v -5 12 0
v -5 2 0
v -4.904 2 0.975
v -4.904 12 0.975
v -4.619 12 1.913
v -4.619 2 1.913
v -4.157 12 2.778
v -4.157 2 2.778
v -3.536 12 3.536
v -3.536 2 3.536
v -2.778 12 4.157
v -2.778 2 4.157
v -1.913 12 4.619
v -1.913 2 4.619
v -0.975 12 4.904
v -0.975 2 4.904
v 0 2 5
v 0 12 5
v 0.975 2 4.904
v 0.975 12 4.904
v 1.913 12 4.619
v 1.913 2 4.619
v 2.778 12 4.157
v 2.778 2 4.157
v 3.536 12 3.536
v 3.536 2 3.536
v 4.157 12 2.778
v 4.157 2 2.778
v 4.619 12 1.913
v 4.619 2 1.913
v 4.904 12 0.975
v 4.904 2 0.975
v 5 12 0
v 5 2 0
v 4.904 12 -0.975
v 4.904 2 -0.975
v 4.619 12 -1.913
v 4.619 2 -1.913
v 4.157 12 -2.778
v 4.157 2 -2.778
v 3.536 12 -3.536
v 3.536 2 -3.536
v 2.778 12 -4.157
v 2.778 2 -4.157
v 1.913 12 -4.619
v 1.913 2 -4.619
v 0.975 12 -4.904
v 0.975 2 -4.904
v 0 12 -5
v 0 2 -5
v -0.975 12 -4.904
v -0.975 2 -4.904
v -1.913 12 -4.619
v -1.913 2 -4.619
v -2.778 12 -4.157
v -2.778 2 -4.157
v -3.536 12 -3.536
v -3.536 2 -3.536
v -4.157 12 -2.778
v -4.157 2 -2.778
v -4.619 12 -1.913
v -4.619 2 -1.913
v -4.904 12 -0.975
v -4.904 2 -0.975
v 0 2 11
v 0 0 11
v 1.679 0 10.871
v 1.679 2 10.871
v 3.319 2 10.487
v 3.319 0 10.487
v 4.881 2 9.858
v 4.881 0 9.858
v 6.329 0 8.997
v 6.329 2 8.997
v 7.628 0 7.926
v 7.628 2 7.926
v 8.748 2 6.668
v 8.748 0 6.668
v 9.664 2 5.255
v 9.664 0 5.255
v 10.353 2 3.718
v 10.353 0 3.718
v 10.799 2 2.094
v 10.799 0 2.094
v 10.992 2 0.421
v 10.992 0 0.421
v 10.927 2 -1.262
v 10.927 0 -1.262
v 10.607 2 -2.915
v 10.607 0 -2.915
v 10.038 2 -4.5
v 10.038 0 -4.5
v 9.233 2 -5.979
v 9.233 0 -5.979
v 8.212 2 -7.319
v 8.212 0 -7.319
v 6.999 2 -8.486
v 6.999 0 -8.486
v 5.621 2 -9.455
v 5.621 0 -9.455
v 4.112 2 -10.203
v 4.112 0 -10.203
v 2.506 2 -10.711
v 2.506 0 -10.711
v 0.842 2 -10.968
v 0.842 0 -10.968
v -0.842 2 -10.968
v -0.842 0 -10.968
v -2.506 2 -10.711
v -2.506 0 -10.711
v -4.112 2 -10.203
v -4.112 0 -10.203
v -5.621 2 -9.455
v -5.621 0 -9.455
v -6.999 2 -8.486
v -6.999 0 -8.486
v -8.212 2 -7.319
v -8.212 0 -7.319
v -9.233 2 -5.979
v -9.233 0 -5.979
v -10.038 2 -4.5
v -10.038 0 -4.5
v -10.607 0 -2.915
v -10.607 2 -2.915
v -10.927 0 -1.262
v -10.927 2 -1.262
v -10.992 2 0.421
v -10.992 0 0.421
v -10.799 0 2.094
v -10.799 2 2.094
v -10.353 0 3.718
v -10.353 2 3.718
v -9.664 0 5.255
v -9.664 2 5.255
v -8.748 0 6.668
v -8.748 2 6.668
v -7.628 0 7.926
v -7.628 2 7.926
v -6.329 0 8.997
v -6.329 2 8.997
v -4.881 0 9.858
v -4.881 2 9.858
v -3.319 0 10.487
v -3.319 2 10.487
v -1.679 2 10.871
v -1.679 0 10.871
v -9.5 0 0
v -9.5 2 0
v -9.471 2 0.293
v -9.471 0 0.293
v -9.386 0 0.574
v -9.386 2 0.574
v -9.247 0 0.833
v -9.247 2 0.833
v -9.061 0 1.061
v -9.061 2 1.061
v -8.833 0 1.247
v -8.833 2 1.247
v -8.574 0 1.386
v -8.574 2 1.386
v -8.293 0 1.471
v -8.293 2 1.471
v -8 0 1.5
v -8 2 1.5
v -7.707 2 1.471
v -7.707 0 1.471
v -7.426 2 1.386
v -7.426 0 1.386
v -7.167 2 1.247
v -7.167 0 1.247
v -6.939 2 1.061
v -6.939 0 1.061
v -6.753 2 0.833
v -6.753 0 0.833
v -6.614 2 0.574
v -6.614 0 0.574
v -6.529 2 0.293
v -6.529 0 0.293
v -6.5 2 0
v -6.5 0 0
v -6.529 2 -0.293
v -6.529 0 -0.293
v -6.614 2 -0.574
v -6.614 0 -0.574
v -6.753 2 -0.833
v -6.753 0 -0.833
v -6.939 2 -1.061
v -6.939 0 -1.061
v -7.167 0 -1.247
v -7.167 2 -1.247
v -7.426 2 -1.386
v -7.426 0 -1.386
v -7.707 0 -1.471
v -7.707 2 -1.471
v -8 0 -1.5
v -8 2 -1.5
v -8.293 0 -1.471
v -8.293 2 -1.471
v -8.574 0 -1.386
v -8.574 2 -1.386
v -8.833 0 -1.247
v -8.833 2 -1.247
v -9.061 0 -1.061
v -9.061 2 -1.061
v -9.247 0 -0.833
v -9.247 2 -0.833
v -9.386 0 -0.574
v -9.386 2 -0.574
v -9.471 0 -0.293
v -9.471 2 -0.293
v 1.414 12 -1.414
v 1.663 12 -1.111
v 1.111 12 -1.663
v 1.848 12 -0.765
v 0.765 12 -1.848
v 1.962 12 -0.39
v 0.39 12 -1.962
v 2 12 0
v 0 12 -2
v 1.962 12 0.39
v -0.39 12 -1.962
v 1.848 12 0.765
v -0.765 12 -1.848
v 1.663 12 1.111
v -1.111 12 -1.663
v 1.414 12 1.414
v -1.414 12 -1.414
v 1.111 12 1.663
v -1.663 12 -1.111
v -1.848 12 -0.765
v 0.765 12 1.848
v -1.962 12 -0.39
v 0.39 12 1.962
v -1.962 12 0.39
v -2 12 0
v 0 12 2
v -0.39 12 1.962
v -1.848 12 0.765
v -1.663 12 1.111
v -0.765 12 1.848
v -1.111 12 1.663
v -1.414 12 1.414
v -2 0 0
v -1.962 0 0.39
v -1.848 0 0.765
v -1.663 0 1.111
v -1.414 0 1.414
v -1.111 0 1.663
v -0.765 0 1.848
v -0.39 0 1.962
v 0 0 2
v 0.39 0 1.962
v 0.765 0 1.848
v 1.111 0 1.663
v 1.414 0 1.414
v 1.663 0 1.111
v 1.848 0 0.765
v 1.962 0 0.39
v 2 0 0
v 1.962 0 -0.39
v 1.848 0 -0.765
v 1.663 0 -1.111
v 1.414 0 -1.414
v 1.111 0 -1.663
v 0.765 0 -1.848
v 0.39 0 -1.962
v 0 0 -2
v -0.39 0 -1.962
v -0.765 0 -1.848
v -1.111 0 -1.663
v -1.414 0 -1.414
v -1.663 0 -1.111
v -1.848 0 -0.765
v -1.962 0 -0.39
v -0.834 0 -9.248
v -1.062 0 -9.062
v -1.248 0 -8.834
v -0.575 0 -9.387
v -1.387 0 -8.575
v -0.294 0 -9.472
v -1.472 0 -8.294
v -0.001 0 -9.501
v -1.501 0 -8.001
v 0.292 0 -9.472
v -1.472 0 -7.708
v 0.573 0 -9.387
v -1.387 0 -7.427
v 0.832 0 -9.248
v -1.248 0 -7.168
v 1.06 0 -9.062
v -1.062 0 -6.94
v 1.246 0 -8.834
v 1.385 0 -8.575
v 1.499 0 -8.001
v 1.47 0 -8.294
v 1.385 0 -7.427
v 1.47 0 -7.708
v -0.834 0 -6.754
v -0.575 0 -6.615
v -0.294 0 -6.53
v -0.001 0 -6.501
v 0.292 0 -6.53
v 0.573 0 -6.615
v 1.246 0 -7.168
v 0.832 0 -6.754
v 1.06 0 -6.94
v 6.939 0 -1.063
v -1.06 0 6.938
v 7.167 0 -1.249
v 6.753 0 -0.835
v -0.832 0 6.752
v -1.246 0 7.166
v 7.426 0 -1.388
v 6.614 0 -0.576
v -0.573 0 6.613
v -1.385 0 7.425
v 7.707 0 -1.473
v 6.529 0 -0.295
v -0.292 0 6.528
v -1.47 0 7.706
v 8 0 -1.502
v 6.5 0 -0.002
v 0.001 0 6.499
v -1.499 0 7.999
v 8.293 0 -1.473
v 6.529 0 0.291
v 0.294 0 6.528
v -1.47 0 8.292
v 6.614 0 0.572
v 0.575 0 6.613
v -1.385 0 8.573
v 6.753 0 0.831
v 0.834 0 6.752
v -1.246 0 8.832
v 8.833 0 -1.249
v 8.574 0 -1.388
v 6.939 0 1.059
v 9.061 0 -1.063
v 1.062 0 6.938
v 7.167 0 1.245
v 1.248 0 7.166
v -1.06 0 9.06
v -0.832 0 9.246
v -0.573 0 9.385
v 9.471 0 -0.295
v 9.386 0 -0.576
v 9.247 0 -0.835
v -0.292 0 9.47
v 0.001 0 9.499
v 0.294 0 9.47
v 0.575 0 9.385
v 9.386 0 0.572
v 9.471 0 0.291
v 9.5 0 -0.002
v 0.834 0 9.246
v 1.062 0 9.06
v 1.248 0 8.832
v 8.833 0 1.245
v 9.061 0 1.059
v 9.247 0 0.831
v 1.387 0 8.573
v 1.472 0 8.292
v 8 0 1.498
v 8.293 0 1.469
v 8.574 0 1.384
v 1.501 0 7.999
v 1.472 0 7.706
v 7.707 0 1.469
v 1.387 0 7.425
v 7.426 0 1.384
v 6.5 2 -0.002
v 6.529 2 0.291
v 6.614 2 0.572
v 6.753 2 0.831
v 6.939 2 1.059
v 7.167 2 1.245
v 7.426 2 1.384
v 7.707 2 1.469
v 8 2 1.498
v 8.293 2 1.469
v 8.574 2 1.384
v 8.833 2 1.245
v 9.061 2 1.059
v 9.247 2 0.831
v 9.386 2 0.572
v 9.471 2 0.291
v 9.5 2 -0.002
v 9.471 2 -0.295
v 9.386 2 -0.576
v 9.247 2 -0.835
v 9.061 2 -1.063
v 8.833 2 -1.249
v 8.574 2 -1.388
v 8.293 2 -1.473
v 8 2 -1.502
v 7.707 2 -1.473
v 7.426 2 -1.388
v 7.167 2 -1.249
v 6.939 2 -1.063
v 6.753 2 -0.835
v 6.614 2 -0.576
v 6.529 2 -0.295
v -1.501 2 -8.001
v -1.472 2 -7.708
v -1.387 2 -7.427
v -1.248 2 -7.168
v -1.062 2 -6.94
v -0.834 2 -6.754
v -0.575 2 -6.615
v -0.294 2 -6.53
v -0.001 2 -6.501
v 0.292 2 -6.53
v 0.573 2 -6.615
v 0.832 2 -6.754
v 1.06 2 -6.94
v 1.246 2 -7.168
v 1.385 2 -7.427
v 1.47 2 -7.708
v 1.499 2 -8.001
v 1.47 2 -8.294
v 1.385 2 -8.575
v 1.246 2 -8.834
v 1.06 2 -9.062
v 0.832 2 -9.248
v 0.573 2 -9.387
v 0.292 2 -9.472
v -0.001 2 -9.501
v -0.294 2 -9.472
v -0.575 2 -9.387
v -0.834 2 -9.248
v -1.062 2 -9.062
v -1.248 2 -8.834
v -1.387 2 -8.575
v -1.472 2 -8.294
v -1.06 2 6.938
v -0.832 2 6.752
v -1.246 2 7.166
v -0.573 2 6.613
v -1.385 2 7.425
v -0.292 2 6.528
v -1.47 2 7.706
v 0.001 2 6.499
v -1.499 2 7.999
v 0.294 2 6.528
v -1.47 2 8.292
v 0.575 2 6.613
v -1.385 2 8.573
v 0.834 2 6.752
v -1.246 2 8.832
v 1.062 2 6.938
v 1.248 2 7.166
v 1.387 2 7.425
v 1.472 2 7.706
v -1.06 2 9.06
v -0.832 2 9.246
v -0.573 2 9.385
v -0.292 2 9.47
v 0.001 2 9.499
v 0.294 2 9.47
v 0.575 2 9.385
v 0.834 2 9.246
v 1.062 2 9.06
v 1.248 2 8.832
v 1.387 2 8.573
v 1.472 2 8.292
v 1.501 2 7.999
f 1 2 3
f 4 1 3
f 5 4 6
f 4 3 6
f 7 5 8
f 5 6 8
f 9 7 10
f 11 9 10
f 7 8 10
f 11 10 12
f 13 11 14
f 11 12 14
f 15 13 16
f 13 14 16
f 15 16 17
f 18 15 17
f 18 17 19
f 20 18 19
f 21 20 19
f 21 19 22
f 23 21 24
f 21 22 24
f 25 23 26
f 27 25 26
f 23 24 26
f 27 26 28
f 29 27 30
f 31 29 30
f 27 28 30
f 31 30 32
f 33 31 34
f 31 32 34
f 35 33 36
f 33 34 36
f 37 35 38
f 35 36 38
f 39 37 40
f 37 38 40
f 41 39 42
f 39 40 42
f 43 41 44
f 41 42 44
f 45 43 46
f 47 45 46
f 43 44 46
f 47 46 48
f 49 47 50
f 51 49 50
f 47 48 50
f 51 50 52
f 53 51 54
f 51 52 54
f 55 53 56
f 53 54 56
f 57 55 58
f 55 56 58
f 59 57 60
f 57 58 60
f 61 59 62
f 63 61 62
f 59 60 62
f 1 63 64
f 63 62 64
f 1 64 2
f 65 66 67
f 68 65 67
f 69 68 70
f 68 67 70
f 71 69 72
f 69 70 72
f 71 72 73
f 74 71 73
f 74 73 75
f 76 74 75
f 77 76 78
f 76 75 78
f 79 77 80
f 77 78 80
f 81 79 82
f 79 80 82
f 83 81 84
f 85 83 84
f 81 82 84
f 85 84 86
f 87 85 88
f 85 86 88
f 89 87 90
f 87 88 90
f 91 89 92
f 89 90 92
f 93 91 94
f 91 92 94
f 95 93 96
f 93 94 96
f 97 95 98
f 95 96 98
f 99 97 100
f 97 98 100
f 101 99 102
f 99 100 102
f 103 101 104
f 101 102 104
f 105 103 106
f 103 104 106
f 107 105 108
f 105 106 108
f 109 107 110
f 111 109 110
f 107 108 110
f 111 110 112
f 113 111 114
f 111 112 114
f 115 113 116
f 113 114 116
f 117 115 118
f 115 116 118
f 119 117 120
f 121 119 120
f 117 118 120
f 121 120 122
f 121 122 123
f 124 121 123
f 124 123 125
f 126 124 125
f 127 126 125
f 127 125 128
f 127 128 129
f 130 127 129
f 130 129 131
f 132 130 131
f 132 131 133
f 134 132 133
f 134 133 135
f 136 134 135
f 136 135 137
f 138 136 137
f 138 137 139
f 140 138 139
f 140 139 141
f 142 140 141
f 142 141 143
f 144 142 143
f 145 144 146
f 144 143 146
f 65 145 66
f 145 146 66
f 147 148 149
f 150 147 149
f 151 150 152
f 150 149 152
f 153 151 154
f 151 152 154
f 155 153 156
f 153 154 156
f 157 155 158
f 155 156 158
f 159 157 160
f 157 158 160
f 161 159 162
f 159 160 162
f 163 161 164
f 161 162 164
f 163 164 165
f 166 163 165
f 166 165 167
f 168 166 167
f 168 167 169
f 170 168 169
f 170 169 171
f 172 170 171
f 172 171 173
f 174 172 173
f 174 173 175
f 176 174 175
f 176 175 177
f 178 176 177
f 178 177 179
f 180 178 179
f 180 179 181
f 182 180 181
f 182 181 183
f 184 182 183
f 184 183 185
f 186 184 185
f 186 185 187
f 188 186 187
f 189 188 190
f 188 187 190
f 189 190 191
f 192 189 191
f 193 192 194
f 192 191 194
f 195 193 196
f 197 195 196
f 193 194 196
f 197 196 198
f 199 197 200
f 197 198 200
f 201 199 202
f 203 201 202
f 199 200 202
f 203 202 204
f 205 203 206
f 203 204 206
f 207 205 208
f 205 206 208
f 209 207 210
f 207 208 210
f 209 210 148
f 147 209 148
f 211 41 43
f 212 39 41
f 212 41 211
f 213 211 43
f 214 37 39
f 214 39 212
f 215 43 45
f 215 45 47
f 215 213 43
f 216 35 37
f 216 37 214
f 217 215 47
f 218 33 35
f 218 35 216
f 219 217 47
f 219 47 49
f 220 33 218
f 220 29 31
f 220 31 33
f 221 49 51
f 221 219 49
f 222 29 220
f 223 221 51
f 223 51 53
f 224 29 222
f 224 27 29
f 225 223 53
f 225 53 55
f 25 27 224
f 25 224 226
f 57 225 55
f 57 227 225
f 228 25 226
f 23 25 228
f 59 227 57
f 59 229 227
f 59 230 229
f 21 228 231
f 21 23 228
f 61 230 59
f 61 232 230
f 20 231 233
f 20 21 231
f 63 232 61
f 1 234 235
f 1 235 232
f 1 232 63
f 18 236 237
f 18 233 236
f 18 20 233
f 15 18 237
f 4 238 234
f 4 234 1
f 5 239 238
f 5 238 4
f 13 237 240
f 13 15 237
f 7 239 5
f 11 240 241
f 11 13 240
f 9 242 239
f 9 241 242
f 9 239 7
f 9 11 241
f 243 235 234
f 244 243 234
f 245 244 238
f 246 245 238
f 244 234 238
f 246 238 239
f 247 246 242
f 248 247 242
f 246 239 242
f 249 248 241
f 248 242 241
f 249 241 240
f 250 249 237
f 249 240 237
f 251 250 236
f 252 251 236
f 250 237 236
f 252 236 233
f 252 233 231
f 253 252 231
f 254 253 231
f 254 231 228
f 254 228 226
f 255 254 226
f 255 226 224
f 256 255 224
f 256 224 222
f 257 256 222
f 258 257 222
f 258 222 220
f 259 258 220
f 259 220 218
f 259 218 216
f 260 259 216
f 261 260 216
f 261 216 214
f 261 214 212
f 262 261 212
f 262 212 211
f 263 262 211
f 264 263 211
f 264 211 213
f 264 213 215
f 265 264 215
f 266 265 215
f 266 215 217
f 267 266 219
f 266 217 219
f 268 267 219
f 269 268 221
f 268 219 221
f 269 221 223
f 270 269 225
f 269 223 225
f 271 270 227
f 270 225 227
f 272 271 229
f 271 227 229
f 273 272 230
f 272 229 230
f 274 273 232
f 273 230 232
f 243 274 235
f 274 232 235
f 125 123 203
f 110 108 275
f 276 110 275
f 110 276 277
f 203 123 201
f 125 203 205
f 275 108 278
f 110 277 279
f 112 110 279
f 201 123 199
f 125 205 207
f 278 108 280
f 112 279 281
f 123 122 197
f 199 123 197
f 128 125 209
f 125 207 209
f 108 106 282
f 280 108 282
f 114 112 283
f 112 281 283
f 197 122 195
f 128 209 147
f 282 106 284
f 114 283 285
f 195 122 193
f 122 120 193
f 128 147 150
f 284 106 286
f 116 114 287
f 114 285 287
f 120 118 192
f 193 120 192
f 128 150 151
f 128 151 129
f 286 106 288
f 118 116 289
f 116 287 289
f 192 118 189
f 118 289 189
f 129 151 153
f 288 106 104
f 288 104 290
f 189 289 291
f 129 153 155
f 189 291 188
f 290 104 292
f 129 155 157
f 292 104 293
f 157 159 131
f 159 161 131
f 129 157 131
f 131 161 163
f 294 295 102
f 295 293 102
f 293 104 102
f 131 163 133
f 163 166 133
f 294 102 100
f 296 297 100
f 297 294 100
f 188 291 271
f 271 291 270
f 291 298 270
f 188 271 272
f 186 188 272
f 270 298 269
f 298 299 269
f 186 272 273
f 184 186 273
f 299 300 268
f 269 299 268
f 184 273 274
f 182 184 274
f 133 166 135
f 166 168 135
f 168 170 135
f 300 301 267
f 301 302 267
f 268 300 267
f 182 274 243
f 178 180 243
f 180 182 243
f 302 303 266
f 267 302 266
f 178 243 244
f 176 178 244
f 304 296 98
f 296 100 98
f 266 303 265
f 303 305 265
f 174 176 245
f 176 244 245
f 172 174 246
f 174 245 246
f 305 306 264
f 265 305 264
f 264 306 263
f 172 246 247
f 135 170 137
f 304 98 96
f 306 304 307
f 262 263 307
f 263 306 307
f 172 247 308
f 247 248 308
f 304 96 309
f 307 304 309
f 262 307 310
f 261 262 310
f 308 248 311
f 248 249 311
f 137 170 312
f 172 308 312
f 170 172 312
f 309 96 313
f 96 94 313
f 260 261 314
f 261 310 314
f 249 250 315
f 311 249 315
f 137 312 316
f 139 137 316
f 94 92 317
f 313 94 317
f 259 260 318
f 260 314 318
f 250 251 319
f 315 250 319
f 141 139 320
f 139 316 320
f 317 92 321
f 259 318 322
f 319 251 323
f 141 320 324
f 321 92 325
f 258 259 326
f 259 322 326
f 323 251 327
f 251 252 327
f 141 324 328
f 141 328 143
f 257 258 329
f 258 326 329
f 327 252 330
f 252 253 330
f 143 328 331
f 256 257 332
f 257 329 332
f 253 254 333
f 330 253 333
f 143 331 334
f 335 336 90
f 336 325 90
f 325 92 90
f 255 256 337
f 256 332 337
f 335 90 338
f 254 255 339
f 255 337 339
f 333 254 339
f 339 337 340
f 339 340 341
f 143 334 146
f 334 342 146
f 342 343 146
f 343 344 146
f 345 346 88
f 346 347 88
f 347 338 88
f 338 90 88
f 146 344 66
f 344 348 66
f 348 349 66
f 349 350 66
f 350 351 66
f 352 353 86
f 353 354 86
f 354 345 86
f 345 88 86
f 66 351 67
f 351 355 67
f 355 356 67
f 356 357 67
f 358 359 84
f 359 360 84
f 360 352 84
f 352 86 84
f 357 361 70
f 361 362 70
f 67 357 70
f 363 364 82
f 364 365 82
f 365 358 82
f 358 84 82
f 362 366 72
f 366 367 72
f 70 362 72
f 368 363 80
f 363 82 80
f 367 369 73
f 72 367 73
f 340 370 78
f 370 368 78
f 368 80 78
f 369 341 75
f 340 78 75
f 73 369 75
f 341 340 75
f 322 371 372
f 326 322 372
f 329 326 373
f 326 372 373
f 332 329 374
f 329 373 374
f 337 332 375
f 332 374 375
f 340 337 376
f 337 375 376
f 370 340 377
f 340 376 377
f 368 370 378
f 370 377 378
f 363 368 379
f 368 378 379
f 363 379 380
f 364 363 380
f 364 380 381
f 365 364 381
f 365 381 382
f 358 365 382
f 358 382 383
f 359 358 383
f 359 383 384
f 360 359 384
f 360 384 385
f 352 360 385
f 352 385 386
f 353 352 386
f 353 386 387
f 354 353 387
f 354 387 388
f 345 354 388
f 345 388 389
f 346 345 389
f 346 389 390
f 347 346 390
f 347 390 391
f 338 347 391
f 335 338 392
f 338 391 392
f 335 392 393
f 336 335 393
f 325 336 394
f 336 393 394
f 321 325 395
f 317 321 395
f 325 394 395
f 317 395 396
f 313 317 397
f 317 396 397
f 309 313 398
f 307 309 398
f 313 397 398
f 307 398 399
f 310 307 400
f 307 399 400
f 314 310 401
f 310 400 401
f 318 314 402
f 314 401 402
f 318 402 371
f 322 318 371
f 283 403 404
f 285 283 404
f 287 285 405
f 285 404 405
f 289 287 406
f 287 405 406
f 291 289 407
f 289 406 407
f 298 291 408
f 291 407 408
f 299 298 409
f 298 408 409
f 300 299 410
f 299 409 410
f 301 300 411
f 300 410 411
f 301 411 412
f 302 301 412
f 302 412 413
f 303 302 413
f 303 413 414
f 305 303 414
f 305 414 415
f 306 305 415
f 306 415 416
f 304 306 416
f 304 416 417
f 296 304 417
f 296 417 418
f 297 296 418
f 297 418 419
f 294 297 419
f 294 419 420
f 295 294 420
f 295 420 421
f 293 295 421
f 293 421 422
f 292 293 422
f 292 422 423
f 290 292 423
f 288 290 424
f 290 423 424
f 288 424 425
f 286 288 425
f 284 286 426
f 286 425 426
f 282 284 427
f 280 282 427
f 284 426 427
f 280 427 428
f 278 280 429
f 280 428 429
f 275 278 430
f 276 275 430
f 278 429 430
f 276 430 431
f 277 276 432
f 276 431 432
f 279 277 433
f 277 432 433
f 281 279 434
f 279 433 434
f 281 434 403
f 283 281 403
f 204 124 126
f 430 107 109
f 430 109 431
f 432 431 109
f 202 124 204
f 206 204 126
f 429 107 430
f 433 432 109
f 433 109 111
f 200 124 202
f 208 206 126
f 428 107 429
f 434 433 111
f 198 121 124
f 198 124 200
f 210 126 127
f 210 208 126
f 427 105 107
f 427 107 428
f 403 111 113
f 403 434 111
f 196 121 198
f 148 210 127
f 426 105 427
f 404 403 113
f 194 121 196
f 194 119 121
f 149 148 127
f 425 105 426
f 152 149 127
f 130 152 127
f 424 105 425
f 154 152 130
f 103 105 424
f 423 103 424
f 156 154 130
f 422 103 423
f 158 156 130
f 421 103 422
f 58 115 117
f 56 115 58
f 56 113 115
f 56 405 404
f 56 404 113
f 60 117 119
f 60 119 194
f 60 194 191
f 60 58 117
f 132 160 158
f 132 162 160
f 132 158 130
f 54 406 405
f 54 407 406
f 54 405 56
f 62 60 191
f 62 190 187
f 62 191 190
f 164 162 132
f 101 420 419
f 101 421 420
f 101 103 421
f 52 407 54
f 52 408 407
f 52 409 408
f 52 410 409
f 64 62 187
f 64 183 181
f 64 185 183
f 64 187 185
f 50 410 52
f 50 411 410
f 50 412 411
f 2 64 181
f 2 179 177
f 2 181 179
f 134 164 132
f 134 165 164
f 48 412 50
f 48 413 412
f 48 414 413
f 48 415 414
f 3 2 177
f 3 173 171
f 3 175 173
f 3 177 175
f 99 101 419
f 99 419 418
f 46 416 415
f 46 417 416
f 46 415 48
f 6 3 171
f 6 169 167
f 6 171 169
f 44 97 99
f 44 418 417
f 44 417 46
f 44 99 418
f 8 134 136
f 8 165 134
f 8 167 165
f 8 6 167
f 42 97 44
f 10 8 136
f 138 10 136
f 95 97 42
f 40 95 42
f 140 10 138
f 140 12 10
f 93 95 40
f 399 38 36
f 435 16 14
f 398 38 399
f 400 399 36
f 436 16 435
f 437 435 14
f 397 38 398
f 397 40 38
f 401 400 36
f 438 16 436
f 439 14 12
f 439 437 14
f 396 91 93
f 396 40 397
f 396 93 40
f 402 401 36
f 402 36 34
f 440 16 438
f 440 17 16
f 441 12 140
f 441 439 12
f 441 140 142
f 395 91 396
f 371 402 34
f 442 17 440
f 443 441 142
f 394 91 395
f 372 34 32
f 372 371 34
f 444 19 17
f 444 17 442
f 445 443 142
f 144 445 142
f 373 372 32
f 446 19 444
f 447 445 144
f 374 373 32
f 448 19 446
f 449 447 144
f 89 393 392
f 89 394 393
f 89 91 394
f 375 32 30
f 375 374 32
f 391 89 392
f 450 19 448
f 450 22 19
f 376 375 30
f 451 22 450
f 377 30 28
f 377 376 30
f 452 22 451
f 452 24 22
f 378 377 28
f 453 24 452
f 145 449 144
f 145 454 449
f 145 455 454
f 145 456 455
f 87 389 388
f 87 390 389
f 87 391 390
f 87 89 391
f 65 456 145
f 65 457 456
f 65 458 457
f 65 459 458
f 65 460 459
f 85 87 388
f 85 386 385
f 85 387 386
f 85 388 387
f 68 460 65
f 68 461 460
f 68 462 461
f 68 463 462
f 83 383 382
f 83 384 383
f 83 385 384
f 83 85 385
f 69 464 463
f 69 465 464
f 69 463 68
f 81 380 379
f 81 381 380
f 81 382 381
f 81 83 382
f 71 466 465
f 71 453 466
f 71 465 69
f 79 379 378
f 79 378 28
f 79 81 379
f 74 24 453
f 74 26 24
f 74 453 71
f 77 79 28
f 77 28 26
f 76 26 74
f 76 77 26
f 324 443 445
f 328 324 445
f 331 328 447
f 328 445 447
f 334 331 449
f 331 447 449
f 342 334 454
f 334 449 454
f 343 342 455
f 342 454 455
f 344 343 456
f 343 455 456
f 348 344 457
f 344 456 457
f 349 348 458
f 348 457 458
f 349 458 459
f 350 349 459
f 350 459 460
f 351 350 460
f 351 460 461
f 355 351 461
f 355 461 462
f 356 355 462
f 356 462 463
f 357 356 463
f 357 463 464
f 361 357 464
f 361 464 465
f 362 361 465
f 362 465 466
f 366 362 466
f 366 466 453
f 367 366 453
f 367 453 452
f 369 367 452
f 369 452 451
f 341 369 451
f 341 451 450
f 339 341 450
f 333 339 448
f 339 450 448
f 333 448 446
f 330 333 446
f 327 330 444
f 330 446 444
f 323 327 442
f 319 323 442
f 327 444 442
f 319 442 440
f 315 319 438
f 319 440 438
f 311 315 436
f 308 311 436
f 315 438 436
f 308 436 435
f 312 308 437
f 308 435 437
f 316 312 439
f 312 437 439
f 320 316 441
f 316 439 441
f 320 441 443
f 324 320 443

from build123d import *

# Parameters (mm, degrees)
SKETCH_1_R          = 11
EXTRUDE_1_DEPTH     = 2
SKETCH_2_R          = 5
EXTRUDE_2_DEPTH     = 10
SKETCH_3_R          = 1.5
CUT_EXTRUDE_1_DEPTH = 10
SKETCH_5_R          = 2
CUT_EXTRUDE_2_DEPTH = 20.646882704


with BuildPart() as part:
    # 草图1 → 凸台-拉伸1 (new body)
    with BuildSketch(Plane(origin=(0, 0, 0), x_dir=(0, 0, -1), z_dir=(0, 1, 0))):
        with Locations(Location((0, 0, 0), (0, 0, 180))):
            Circle(SKETCH_1_R)
    extrude(amount=EXTRUDE_1_DEPTH)

    # 草图2 → 凸台-拉伸2 (add)
    with BuildSketch(Plane(origin=(0, 2, 0), x_dir=(0, 0, -1), z_dir=(0, 1, 0))):
        with Locations(Location((0, 0, 0), (0, 0, 90))):
            Circle(SKETCH_2_R)
    extrude(amount=EXTRUDE_2_DEPTH)

    # 草图3 → 切除-拉伸1 (cut)
    with BuildSketch(Plane(origin=(0, 2, 0), x_dir=(0, 0, -1), z_dir=(0, 1, 0))):
        with Locations(Location((0, 8, 0), (0, 0, 90))):
            Circle(SKETCH_3_R)
        with Locations(Location((8.001, 0.001, 0), (0, 0, 90))):
            Circle(SKETCH_3_R)
        with Locations(Location((0.002, -8, 0), (0, 0, 90))):
            Circle(SKETCH_3_R)
        with Locations(Location((-7.999, -0.001, 0), (0, 0, 90))):
            Circle(SKETCH_3_R)
    extrude(amount=-CUT_EXTRUDE_1_DEPTH, mode=Mode.SUBTRACT)

    # 草图5 → 切除-拉伸2 (cut, through all)
    with BuildSketch(Plane(origin=(0, 12, 0), x_dir=(1, 0, 0), z_dir=(0, 1, 0))):
        with Locations(Location((0, 0, 0), (0, 0, 180))):
            Circle(SKETCH_5_R)
    extrude(amount=-CUT_EXTRUDE_2_DEPTH, mode=Mode.SUBTRACT)


solid = part.part
